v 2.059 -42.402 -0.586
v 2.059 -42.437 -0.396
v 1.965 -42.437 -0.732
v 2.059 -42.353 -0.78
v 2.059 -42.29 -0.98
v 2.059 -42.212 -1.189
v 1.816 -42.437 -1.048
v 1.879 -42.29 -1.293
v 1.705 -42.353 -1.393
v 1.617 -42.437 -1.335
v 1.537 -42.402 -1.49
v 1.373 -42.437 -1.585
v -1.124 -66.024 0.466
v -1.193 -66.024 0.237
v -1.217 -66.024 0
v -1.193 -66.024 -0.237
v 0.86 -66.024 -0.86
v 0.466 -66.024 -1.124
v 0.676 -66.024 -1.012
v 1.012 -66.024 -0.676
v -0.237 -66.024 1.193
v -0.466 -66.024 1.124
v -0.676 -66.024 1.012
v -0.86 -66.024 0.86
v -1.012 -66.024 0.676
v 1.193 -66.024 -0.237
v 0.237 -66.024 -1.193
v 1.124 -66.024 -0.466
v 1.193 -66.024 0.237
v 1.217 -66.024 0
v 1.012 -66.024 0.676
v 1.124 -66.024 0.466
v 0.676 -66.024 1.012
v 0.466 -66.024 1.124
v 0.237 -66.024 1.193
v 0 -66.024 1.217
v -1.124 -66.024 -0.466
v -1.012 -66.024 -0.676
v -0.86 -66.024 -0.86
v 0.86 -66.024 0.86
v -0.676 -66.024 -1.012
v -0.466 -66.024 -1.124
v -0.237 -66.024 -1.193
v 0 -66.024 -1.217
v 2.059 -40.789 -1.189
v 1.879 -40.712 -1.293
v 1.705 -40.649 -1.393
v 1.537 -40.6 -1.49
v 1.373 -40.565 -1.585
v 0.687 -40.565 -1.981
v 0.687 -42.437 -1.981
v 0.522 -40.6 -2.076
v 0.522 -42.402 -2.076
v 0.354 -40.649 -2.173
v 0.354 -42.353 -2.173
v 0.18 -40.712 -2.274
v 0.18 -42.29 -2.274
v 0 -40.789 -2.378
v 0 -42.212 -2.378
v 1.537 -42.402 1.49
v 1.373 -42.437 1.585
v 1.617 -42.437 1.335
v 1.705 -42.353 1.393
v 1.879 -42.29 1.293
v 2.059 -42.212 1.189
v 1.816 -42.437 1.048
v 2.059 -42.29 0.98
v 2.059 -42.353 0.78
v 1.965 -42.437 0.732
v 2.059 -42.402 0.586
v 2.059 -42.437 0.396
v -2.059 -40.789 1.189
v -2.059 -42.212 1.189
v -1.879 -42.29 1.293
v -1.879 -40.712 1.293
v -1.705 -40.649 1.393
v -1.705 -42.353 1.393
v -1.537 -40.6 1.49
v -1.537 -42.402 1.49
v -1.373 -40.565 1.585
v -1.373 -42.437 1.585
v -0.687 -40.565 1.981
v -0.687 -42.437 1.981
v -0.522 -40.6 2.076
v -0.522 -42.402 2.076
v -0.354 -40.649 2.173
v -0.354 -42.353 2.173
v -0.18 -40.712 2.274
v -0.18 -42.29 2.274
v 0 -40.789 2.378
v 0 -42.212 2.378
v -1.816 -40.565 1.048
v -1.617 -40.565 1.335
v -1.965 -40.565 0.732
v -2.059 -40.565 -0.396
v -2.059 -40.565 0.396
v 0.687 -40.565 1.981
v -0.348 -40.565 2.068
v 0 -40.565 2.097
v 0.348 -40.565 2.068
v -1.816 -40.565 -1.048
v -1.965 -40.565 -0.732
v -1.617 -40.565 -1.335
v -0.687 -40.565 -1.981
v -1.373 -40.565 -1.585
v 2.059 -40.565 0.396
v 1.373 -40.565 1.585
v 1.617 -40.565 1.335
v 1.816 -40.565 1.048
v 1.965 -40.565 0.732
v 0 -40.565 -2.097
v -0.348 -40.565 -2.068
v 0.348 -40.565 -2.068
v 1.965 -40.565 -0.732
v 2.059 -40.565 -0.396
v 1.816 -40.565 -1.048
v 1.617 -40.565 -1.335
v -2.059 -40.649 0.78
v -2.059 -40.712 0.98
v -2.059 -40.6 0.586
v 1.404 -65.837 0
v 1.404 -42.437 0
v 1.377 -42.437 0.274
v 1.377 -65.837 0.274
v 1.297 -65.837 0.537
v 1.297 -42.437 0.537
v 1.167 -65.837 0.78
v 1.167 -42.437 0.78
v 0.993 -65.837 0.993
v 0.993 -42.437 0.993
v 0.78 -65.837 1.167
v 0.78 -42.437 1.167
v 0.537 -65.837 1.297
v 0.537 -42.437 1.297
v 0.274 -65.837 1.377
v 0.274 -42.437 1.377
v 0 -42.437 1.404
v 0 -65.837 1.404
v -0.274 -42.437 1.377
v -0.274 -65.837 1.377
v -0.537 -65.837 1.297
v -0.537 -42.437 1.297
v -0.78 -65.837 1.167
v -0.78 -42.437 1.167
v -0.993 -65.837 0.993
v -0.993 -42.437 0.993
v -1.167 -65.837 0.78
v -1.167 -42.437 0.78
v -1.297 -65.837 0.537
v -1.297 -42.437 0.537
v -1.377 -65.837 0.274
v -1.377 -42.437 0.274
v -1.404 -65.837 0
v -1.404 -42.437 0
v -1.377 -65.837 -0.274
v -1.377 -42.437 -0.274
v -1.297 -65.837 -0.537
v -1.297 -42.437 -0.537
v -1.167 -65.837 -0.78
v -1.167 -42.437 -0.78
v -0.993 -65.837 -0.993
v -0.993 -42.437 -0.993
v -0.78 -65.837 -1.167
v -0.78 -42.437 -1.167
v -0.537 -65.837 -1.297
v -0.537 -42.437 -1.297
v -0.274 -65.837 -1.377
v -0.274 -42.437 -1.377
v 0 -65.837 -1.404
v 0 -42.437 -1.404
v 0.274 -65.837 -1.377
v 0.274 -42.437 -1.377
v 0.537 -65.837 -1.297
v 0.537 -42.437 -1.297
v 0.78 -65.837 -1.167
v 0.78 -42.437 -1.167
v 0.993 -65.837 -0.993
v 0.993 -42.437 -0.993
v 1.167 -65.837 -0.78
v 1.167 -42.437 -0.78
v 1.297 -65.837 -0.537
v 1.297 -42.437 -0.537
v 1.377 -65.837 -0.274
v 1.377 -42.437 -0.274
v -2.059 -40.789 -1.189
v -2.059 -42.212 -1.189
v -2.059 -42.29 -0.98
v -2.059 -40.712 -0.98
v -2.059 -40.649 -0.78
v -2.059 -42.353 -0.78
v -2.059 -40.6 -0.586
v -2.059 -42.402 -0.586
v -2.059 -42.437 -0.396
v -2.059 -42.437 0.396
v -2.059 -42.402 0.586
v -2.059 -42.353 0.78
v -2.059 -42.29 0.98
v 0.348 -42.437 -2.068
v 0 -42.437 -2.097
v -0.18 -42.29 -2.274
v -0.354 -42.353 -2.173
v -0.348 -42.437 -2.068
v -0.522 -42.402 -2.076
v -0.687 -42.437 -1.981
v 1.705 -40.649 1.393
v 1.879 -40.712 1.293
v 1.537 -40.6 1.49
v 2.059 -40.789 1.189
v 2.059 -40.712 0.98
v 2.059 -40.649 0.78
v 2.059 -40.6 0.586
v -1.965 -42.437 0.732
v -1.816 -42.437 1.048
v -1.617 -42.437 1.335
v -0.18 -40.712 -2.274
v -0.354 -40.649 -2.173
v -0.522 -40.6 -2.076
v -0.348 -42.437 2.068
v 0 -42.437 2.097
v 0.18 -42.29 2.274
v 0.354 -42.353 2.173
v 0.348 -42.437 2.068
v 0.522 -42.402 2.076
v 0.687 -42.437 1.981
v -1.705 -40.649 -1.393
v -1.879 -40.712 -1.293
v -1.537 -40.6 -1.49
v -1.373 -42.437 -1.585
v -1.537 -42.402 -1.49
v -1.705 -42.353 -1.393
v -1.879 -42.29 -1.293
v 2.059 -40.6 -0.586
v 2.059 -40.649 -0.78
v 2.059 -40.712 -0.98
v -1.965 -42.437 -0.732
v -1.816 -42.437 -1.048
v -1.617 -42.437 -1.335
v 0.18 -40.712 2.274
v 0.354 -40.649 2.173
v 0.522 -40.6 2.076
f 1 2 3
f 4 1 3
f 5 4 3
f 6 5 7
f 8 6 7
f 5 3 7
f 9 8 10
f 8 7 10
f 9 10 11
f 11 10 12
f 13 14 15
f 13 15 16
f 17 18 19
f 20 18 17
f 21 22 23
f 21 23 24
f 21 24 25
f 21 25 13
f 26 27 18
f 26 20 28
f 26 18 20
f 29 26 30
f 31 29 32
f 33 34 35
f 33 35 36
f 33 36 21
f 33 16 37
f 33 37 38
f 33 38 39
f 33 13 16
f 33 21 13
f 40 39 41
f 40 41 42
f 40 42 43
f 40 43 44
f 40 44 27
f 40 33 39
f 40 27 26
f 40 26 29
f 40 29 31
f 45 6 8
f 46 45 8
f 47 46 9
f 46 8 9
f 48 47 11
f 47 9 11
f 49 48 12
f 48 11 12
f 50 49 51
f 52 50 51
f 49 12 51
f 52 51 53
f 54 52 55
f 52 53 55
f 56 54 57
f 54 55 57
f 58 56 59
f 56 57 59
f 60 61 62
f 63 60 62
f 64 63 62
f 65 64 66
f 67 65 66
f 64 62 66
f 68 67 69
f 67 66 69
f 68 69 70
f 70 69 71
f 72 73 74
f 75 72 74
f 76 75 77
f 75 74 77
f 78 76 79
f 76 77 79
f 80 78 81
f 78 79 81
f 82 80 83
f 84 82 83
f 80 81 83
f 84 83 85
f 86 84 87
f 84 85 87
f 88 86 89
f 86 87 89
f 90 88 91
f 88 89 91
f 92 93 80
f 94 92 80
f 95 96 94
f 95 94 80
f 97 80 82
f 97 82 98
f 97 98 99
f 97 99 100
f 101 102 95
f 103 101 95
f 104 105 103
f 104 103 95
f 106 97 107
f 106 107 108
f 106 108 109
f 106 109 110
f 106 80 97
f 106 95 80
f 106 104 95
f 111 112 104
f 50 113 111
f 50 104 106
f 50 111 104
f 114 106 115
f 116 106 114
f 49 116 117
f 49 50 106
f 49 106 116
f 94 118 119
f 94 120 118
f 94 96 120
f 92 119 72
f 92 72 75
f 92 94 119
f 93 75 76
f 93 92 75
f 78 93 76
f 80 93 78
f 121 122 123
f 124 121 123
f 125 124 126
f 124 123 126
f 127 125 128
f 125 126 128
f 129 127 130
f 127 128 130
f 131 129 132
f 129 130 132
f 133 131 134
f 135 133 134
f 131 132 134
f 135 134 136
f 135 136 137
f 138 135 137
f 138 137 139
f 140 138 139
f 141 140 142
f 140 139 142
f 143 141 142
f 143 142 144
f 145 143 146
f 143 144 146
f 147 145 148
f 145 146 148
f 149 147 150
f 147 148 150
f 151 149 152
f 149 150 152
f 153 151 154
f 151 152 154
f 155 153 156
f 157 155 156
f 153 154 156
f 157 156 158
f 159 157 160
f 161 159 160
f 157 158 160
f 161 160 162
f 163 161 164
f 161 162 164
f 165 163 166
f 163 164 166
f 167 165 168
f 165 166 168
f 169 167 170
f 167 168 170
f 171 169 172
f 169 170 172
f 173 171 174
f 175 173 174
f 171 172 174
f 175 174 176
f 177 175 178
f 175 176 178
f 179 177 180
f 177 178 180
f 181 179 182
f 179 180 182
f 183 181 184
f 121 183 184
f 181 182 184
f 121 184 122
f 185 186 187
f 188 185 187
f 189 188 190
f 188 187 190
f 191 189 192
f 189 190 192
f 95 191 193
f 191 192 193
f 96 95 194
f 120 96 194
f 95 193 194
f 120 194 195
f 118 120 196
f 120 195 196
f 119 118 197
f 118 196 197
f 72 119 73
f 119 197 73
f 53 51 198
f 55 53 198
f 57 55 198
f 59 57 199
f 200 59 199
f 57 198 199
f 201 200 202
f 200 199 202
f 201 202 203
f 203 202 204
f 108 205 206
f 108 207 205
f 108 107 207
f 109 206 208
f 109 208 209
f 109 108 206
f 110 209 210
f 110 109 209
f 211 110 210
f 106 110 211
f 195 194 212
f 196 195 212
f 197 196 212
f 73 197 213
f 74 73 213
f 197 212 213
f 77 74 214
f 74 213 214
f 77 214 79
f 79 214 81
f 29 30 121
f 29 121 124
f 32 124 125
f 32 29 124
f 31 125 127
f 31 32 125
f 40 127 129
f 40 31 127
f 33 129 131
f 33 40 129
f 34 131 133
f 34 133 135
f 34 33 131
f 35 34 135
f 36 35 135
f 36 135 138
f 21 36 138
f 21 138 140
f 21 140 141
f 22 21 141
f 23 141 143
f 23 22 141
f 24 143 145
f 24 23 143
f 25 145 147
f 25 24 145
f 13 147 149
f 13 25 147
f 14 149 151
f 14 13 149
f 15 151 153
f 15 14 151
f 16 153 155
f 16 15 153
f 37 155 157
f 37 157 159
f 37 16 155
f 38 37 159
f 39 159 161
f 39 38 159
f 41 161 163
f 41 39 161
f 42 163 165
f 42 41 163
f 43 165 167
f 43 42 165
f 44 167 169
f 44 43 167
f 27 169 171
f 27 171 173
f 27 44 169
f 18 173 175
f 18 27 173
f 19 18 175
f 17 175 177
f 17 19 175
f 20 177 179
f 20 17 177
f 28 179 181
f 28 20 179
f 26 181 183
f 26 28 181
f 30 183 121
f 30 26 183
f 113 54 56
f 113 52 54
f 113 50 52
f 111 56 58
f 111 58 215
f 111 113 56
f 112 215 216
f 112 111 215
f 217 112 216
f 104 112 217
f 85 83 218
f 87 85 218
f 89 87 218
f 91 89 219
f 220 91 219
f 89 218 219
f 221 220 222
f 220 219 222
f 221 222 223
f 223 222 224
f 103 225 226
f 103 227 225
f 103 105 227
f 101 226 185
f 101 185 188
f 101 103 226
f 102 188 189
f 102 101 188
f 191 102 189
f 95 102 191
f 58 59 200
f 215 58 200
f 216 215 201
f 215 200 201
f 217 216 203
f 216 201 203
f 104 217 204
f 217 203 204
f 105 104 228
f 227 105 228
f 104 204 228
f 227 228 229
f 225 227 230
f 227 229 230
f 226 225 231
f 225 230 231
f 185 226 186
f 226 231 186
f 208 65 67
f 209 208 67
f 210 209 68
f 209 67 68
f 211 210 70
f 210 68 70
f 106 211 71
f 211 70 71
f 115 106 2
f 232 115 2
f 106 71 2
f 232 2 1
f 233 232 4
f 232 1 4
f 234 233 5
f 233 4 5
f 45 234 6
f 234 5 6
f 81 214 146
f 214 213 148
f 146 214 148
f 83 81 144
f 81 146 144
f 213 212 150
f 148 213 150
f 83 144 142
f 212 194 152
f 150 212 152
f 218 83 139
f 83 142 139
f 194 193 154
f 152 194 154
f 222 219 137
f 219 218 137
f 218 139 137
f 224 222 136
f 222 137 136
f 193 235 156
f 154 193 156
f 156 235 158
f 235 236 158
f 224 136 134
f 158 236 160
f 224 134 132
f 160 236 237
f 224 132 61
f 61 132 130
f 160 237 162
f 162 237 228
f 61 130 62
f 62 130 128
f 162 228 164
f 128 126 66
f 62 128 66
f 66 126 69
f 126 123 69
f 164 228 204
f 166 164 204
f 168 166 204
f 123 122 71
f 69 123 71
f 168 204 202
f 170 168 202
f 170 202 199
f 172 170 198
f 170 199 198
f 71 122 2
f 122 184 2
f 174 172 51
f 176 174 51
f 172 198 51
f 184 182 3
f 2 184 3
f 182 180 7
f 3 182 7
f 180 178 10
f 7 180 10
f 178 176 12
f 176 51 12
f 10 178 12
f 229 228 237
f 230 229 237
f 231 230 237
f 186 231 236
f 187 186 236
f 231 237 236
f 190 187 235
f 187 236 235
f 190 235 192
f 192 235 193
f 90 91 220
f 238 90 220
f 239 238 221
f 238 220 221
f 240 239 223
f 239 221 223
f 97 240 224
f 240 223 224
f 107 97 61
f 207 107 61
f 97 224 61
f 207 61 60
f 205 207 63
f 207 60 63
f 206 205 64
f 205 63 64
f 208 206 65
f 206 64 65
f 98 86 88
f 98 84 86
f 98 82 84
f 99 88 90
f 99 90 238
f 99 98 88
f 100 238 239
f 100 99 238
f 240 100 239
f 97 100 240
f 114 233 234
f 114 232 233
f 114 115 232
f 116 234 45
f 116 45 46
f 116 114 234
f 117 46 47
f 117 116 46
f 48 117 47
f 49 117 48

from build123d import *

# Parameters (mm, degrees)
BOSS_EXTRUDE1_DEPTH = 10
SKETCH2_R           = 7.5
BOSS_EXTRUDE2_DEPTH = 126
CHAMFER1_SIZE       = 1
SCALE1_SCALE        = 0.18
SCALE2_SCALE        = 1.04


with BuildPart() as part:
    # Sketch1 → Boss-Extrude1 (new body)
    with BuildSketch(Plane(origin=(0, 0, 0), x_dir=(1, 0, 0), z_dir=(0, 1, 0))):
        Polygon((0, 12.701705922), (-11, 6.350852961), (-11, -6.350852961), (0, -12.701705922), (11, -6.350852961), (11, 6.350852961), align=None)
    extrude(amount=BOSS_EXTRUDE1_DEPTH)

    # Sketch2 → Boss-Extrude2 (add)
    with BuildSketch(Plane.XZ):
        Circle(SKETCH2_R)
    extrude(amount=BOSS_EXTRUDE2_DEPTH)

    # Chamfer1
    chamfer1_edges = [part.edges().sort_by_distance(p)[0] for p in [
        (-7.5, -126, 0),
    ]]
    chamfer(chamfer1_edges, length=CHAMFER1_SIZE)

    # Sketch4 → Cut-Revolve2 (revolve, cut)
    with BuildSketch(Plane(origin=(0, 0, 0), x_dir=(0, 0, -1), z_dir=(1, 0, 0))):
        Polygon((-12.701705922, 10), (-12.701705922, 8.8), (-11.201705922, 10), align=None)
        Polygon((-12.701705922, 0), (-12.701705922, 1.2), (-11.201705922, 0), align=None)
    revolve(axis=Axis((0, 0, 0), (0, 1, 0)), mode=Mode.SUBTRACT)


with BuildPart() as part_1:
    # Scale1: scaled about (0, -52.210522466, 0)
    add(part.part.scale(SCALE1_SCALE).moved(Location((0, -42.812628422, 0))))


with BuildPart() as part_2:
    # Scale2: scaled about (0, -52.210522466, 0)
    add(part_1.part.scale(SCALE2_SCALE).moved(Location((0, 2.088420899, 0))))


solid = part_2.part
